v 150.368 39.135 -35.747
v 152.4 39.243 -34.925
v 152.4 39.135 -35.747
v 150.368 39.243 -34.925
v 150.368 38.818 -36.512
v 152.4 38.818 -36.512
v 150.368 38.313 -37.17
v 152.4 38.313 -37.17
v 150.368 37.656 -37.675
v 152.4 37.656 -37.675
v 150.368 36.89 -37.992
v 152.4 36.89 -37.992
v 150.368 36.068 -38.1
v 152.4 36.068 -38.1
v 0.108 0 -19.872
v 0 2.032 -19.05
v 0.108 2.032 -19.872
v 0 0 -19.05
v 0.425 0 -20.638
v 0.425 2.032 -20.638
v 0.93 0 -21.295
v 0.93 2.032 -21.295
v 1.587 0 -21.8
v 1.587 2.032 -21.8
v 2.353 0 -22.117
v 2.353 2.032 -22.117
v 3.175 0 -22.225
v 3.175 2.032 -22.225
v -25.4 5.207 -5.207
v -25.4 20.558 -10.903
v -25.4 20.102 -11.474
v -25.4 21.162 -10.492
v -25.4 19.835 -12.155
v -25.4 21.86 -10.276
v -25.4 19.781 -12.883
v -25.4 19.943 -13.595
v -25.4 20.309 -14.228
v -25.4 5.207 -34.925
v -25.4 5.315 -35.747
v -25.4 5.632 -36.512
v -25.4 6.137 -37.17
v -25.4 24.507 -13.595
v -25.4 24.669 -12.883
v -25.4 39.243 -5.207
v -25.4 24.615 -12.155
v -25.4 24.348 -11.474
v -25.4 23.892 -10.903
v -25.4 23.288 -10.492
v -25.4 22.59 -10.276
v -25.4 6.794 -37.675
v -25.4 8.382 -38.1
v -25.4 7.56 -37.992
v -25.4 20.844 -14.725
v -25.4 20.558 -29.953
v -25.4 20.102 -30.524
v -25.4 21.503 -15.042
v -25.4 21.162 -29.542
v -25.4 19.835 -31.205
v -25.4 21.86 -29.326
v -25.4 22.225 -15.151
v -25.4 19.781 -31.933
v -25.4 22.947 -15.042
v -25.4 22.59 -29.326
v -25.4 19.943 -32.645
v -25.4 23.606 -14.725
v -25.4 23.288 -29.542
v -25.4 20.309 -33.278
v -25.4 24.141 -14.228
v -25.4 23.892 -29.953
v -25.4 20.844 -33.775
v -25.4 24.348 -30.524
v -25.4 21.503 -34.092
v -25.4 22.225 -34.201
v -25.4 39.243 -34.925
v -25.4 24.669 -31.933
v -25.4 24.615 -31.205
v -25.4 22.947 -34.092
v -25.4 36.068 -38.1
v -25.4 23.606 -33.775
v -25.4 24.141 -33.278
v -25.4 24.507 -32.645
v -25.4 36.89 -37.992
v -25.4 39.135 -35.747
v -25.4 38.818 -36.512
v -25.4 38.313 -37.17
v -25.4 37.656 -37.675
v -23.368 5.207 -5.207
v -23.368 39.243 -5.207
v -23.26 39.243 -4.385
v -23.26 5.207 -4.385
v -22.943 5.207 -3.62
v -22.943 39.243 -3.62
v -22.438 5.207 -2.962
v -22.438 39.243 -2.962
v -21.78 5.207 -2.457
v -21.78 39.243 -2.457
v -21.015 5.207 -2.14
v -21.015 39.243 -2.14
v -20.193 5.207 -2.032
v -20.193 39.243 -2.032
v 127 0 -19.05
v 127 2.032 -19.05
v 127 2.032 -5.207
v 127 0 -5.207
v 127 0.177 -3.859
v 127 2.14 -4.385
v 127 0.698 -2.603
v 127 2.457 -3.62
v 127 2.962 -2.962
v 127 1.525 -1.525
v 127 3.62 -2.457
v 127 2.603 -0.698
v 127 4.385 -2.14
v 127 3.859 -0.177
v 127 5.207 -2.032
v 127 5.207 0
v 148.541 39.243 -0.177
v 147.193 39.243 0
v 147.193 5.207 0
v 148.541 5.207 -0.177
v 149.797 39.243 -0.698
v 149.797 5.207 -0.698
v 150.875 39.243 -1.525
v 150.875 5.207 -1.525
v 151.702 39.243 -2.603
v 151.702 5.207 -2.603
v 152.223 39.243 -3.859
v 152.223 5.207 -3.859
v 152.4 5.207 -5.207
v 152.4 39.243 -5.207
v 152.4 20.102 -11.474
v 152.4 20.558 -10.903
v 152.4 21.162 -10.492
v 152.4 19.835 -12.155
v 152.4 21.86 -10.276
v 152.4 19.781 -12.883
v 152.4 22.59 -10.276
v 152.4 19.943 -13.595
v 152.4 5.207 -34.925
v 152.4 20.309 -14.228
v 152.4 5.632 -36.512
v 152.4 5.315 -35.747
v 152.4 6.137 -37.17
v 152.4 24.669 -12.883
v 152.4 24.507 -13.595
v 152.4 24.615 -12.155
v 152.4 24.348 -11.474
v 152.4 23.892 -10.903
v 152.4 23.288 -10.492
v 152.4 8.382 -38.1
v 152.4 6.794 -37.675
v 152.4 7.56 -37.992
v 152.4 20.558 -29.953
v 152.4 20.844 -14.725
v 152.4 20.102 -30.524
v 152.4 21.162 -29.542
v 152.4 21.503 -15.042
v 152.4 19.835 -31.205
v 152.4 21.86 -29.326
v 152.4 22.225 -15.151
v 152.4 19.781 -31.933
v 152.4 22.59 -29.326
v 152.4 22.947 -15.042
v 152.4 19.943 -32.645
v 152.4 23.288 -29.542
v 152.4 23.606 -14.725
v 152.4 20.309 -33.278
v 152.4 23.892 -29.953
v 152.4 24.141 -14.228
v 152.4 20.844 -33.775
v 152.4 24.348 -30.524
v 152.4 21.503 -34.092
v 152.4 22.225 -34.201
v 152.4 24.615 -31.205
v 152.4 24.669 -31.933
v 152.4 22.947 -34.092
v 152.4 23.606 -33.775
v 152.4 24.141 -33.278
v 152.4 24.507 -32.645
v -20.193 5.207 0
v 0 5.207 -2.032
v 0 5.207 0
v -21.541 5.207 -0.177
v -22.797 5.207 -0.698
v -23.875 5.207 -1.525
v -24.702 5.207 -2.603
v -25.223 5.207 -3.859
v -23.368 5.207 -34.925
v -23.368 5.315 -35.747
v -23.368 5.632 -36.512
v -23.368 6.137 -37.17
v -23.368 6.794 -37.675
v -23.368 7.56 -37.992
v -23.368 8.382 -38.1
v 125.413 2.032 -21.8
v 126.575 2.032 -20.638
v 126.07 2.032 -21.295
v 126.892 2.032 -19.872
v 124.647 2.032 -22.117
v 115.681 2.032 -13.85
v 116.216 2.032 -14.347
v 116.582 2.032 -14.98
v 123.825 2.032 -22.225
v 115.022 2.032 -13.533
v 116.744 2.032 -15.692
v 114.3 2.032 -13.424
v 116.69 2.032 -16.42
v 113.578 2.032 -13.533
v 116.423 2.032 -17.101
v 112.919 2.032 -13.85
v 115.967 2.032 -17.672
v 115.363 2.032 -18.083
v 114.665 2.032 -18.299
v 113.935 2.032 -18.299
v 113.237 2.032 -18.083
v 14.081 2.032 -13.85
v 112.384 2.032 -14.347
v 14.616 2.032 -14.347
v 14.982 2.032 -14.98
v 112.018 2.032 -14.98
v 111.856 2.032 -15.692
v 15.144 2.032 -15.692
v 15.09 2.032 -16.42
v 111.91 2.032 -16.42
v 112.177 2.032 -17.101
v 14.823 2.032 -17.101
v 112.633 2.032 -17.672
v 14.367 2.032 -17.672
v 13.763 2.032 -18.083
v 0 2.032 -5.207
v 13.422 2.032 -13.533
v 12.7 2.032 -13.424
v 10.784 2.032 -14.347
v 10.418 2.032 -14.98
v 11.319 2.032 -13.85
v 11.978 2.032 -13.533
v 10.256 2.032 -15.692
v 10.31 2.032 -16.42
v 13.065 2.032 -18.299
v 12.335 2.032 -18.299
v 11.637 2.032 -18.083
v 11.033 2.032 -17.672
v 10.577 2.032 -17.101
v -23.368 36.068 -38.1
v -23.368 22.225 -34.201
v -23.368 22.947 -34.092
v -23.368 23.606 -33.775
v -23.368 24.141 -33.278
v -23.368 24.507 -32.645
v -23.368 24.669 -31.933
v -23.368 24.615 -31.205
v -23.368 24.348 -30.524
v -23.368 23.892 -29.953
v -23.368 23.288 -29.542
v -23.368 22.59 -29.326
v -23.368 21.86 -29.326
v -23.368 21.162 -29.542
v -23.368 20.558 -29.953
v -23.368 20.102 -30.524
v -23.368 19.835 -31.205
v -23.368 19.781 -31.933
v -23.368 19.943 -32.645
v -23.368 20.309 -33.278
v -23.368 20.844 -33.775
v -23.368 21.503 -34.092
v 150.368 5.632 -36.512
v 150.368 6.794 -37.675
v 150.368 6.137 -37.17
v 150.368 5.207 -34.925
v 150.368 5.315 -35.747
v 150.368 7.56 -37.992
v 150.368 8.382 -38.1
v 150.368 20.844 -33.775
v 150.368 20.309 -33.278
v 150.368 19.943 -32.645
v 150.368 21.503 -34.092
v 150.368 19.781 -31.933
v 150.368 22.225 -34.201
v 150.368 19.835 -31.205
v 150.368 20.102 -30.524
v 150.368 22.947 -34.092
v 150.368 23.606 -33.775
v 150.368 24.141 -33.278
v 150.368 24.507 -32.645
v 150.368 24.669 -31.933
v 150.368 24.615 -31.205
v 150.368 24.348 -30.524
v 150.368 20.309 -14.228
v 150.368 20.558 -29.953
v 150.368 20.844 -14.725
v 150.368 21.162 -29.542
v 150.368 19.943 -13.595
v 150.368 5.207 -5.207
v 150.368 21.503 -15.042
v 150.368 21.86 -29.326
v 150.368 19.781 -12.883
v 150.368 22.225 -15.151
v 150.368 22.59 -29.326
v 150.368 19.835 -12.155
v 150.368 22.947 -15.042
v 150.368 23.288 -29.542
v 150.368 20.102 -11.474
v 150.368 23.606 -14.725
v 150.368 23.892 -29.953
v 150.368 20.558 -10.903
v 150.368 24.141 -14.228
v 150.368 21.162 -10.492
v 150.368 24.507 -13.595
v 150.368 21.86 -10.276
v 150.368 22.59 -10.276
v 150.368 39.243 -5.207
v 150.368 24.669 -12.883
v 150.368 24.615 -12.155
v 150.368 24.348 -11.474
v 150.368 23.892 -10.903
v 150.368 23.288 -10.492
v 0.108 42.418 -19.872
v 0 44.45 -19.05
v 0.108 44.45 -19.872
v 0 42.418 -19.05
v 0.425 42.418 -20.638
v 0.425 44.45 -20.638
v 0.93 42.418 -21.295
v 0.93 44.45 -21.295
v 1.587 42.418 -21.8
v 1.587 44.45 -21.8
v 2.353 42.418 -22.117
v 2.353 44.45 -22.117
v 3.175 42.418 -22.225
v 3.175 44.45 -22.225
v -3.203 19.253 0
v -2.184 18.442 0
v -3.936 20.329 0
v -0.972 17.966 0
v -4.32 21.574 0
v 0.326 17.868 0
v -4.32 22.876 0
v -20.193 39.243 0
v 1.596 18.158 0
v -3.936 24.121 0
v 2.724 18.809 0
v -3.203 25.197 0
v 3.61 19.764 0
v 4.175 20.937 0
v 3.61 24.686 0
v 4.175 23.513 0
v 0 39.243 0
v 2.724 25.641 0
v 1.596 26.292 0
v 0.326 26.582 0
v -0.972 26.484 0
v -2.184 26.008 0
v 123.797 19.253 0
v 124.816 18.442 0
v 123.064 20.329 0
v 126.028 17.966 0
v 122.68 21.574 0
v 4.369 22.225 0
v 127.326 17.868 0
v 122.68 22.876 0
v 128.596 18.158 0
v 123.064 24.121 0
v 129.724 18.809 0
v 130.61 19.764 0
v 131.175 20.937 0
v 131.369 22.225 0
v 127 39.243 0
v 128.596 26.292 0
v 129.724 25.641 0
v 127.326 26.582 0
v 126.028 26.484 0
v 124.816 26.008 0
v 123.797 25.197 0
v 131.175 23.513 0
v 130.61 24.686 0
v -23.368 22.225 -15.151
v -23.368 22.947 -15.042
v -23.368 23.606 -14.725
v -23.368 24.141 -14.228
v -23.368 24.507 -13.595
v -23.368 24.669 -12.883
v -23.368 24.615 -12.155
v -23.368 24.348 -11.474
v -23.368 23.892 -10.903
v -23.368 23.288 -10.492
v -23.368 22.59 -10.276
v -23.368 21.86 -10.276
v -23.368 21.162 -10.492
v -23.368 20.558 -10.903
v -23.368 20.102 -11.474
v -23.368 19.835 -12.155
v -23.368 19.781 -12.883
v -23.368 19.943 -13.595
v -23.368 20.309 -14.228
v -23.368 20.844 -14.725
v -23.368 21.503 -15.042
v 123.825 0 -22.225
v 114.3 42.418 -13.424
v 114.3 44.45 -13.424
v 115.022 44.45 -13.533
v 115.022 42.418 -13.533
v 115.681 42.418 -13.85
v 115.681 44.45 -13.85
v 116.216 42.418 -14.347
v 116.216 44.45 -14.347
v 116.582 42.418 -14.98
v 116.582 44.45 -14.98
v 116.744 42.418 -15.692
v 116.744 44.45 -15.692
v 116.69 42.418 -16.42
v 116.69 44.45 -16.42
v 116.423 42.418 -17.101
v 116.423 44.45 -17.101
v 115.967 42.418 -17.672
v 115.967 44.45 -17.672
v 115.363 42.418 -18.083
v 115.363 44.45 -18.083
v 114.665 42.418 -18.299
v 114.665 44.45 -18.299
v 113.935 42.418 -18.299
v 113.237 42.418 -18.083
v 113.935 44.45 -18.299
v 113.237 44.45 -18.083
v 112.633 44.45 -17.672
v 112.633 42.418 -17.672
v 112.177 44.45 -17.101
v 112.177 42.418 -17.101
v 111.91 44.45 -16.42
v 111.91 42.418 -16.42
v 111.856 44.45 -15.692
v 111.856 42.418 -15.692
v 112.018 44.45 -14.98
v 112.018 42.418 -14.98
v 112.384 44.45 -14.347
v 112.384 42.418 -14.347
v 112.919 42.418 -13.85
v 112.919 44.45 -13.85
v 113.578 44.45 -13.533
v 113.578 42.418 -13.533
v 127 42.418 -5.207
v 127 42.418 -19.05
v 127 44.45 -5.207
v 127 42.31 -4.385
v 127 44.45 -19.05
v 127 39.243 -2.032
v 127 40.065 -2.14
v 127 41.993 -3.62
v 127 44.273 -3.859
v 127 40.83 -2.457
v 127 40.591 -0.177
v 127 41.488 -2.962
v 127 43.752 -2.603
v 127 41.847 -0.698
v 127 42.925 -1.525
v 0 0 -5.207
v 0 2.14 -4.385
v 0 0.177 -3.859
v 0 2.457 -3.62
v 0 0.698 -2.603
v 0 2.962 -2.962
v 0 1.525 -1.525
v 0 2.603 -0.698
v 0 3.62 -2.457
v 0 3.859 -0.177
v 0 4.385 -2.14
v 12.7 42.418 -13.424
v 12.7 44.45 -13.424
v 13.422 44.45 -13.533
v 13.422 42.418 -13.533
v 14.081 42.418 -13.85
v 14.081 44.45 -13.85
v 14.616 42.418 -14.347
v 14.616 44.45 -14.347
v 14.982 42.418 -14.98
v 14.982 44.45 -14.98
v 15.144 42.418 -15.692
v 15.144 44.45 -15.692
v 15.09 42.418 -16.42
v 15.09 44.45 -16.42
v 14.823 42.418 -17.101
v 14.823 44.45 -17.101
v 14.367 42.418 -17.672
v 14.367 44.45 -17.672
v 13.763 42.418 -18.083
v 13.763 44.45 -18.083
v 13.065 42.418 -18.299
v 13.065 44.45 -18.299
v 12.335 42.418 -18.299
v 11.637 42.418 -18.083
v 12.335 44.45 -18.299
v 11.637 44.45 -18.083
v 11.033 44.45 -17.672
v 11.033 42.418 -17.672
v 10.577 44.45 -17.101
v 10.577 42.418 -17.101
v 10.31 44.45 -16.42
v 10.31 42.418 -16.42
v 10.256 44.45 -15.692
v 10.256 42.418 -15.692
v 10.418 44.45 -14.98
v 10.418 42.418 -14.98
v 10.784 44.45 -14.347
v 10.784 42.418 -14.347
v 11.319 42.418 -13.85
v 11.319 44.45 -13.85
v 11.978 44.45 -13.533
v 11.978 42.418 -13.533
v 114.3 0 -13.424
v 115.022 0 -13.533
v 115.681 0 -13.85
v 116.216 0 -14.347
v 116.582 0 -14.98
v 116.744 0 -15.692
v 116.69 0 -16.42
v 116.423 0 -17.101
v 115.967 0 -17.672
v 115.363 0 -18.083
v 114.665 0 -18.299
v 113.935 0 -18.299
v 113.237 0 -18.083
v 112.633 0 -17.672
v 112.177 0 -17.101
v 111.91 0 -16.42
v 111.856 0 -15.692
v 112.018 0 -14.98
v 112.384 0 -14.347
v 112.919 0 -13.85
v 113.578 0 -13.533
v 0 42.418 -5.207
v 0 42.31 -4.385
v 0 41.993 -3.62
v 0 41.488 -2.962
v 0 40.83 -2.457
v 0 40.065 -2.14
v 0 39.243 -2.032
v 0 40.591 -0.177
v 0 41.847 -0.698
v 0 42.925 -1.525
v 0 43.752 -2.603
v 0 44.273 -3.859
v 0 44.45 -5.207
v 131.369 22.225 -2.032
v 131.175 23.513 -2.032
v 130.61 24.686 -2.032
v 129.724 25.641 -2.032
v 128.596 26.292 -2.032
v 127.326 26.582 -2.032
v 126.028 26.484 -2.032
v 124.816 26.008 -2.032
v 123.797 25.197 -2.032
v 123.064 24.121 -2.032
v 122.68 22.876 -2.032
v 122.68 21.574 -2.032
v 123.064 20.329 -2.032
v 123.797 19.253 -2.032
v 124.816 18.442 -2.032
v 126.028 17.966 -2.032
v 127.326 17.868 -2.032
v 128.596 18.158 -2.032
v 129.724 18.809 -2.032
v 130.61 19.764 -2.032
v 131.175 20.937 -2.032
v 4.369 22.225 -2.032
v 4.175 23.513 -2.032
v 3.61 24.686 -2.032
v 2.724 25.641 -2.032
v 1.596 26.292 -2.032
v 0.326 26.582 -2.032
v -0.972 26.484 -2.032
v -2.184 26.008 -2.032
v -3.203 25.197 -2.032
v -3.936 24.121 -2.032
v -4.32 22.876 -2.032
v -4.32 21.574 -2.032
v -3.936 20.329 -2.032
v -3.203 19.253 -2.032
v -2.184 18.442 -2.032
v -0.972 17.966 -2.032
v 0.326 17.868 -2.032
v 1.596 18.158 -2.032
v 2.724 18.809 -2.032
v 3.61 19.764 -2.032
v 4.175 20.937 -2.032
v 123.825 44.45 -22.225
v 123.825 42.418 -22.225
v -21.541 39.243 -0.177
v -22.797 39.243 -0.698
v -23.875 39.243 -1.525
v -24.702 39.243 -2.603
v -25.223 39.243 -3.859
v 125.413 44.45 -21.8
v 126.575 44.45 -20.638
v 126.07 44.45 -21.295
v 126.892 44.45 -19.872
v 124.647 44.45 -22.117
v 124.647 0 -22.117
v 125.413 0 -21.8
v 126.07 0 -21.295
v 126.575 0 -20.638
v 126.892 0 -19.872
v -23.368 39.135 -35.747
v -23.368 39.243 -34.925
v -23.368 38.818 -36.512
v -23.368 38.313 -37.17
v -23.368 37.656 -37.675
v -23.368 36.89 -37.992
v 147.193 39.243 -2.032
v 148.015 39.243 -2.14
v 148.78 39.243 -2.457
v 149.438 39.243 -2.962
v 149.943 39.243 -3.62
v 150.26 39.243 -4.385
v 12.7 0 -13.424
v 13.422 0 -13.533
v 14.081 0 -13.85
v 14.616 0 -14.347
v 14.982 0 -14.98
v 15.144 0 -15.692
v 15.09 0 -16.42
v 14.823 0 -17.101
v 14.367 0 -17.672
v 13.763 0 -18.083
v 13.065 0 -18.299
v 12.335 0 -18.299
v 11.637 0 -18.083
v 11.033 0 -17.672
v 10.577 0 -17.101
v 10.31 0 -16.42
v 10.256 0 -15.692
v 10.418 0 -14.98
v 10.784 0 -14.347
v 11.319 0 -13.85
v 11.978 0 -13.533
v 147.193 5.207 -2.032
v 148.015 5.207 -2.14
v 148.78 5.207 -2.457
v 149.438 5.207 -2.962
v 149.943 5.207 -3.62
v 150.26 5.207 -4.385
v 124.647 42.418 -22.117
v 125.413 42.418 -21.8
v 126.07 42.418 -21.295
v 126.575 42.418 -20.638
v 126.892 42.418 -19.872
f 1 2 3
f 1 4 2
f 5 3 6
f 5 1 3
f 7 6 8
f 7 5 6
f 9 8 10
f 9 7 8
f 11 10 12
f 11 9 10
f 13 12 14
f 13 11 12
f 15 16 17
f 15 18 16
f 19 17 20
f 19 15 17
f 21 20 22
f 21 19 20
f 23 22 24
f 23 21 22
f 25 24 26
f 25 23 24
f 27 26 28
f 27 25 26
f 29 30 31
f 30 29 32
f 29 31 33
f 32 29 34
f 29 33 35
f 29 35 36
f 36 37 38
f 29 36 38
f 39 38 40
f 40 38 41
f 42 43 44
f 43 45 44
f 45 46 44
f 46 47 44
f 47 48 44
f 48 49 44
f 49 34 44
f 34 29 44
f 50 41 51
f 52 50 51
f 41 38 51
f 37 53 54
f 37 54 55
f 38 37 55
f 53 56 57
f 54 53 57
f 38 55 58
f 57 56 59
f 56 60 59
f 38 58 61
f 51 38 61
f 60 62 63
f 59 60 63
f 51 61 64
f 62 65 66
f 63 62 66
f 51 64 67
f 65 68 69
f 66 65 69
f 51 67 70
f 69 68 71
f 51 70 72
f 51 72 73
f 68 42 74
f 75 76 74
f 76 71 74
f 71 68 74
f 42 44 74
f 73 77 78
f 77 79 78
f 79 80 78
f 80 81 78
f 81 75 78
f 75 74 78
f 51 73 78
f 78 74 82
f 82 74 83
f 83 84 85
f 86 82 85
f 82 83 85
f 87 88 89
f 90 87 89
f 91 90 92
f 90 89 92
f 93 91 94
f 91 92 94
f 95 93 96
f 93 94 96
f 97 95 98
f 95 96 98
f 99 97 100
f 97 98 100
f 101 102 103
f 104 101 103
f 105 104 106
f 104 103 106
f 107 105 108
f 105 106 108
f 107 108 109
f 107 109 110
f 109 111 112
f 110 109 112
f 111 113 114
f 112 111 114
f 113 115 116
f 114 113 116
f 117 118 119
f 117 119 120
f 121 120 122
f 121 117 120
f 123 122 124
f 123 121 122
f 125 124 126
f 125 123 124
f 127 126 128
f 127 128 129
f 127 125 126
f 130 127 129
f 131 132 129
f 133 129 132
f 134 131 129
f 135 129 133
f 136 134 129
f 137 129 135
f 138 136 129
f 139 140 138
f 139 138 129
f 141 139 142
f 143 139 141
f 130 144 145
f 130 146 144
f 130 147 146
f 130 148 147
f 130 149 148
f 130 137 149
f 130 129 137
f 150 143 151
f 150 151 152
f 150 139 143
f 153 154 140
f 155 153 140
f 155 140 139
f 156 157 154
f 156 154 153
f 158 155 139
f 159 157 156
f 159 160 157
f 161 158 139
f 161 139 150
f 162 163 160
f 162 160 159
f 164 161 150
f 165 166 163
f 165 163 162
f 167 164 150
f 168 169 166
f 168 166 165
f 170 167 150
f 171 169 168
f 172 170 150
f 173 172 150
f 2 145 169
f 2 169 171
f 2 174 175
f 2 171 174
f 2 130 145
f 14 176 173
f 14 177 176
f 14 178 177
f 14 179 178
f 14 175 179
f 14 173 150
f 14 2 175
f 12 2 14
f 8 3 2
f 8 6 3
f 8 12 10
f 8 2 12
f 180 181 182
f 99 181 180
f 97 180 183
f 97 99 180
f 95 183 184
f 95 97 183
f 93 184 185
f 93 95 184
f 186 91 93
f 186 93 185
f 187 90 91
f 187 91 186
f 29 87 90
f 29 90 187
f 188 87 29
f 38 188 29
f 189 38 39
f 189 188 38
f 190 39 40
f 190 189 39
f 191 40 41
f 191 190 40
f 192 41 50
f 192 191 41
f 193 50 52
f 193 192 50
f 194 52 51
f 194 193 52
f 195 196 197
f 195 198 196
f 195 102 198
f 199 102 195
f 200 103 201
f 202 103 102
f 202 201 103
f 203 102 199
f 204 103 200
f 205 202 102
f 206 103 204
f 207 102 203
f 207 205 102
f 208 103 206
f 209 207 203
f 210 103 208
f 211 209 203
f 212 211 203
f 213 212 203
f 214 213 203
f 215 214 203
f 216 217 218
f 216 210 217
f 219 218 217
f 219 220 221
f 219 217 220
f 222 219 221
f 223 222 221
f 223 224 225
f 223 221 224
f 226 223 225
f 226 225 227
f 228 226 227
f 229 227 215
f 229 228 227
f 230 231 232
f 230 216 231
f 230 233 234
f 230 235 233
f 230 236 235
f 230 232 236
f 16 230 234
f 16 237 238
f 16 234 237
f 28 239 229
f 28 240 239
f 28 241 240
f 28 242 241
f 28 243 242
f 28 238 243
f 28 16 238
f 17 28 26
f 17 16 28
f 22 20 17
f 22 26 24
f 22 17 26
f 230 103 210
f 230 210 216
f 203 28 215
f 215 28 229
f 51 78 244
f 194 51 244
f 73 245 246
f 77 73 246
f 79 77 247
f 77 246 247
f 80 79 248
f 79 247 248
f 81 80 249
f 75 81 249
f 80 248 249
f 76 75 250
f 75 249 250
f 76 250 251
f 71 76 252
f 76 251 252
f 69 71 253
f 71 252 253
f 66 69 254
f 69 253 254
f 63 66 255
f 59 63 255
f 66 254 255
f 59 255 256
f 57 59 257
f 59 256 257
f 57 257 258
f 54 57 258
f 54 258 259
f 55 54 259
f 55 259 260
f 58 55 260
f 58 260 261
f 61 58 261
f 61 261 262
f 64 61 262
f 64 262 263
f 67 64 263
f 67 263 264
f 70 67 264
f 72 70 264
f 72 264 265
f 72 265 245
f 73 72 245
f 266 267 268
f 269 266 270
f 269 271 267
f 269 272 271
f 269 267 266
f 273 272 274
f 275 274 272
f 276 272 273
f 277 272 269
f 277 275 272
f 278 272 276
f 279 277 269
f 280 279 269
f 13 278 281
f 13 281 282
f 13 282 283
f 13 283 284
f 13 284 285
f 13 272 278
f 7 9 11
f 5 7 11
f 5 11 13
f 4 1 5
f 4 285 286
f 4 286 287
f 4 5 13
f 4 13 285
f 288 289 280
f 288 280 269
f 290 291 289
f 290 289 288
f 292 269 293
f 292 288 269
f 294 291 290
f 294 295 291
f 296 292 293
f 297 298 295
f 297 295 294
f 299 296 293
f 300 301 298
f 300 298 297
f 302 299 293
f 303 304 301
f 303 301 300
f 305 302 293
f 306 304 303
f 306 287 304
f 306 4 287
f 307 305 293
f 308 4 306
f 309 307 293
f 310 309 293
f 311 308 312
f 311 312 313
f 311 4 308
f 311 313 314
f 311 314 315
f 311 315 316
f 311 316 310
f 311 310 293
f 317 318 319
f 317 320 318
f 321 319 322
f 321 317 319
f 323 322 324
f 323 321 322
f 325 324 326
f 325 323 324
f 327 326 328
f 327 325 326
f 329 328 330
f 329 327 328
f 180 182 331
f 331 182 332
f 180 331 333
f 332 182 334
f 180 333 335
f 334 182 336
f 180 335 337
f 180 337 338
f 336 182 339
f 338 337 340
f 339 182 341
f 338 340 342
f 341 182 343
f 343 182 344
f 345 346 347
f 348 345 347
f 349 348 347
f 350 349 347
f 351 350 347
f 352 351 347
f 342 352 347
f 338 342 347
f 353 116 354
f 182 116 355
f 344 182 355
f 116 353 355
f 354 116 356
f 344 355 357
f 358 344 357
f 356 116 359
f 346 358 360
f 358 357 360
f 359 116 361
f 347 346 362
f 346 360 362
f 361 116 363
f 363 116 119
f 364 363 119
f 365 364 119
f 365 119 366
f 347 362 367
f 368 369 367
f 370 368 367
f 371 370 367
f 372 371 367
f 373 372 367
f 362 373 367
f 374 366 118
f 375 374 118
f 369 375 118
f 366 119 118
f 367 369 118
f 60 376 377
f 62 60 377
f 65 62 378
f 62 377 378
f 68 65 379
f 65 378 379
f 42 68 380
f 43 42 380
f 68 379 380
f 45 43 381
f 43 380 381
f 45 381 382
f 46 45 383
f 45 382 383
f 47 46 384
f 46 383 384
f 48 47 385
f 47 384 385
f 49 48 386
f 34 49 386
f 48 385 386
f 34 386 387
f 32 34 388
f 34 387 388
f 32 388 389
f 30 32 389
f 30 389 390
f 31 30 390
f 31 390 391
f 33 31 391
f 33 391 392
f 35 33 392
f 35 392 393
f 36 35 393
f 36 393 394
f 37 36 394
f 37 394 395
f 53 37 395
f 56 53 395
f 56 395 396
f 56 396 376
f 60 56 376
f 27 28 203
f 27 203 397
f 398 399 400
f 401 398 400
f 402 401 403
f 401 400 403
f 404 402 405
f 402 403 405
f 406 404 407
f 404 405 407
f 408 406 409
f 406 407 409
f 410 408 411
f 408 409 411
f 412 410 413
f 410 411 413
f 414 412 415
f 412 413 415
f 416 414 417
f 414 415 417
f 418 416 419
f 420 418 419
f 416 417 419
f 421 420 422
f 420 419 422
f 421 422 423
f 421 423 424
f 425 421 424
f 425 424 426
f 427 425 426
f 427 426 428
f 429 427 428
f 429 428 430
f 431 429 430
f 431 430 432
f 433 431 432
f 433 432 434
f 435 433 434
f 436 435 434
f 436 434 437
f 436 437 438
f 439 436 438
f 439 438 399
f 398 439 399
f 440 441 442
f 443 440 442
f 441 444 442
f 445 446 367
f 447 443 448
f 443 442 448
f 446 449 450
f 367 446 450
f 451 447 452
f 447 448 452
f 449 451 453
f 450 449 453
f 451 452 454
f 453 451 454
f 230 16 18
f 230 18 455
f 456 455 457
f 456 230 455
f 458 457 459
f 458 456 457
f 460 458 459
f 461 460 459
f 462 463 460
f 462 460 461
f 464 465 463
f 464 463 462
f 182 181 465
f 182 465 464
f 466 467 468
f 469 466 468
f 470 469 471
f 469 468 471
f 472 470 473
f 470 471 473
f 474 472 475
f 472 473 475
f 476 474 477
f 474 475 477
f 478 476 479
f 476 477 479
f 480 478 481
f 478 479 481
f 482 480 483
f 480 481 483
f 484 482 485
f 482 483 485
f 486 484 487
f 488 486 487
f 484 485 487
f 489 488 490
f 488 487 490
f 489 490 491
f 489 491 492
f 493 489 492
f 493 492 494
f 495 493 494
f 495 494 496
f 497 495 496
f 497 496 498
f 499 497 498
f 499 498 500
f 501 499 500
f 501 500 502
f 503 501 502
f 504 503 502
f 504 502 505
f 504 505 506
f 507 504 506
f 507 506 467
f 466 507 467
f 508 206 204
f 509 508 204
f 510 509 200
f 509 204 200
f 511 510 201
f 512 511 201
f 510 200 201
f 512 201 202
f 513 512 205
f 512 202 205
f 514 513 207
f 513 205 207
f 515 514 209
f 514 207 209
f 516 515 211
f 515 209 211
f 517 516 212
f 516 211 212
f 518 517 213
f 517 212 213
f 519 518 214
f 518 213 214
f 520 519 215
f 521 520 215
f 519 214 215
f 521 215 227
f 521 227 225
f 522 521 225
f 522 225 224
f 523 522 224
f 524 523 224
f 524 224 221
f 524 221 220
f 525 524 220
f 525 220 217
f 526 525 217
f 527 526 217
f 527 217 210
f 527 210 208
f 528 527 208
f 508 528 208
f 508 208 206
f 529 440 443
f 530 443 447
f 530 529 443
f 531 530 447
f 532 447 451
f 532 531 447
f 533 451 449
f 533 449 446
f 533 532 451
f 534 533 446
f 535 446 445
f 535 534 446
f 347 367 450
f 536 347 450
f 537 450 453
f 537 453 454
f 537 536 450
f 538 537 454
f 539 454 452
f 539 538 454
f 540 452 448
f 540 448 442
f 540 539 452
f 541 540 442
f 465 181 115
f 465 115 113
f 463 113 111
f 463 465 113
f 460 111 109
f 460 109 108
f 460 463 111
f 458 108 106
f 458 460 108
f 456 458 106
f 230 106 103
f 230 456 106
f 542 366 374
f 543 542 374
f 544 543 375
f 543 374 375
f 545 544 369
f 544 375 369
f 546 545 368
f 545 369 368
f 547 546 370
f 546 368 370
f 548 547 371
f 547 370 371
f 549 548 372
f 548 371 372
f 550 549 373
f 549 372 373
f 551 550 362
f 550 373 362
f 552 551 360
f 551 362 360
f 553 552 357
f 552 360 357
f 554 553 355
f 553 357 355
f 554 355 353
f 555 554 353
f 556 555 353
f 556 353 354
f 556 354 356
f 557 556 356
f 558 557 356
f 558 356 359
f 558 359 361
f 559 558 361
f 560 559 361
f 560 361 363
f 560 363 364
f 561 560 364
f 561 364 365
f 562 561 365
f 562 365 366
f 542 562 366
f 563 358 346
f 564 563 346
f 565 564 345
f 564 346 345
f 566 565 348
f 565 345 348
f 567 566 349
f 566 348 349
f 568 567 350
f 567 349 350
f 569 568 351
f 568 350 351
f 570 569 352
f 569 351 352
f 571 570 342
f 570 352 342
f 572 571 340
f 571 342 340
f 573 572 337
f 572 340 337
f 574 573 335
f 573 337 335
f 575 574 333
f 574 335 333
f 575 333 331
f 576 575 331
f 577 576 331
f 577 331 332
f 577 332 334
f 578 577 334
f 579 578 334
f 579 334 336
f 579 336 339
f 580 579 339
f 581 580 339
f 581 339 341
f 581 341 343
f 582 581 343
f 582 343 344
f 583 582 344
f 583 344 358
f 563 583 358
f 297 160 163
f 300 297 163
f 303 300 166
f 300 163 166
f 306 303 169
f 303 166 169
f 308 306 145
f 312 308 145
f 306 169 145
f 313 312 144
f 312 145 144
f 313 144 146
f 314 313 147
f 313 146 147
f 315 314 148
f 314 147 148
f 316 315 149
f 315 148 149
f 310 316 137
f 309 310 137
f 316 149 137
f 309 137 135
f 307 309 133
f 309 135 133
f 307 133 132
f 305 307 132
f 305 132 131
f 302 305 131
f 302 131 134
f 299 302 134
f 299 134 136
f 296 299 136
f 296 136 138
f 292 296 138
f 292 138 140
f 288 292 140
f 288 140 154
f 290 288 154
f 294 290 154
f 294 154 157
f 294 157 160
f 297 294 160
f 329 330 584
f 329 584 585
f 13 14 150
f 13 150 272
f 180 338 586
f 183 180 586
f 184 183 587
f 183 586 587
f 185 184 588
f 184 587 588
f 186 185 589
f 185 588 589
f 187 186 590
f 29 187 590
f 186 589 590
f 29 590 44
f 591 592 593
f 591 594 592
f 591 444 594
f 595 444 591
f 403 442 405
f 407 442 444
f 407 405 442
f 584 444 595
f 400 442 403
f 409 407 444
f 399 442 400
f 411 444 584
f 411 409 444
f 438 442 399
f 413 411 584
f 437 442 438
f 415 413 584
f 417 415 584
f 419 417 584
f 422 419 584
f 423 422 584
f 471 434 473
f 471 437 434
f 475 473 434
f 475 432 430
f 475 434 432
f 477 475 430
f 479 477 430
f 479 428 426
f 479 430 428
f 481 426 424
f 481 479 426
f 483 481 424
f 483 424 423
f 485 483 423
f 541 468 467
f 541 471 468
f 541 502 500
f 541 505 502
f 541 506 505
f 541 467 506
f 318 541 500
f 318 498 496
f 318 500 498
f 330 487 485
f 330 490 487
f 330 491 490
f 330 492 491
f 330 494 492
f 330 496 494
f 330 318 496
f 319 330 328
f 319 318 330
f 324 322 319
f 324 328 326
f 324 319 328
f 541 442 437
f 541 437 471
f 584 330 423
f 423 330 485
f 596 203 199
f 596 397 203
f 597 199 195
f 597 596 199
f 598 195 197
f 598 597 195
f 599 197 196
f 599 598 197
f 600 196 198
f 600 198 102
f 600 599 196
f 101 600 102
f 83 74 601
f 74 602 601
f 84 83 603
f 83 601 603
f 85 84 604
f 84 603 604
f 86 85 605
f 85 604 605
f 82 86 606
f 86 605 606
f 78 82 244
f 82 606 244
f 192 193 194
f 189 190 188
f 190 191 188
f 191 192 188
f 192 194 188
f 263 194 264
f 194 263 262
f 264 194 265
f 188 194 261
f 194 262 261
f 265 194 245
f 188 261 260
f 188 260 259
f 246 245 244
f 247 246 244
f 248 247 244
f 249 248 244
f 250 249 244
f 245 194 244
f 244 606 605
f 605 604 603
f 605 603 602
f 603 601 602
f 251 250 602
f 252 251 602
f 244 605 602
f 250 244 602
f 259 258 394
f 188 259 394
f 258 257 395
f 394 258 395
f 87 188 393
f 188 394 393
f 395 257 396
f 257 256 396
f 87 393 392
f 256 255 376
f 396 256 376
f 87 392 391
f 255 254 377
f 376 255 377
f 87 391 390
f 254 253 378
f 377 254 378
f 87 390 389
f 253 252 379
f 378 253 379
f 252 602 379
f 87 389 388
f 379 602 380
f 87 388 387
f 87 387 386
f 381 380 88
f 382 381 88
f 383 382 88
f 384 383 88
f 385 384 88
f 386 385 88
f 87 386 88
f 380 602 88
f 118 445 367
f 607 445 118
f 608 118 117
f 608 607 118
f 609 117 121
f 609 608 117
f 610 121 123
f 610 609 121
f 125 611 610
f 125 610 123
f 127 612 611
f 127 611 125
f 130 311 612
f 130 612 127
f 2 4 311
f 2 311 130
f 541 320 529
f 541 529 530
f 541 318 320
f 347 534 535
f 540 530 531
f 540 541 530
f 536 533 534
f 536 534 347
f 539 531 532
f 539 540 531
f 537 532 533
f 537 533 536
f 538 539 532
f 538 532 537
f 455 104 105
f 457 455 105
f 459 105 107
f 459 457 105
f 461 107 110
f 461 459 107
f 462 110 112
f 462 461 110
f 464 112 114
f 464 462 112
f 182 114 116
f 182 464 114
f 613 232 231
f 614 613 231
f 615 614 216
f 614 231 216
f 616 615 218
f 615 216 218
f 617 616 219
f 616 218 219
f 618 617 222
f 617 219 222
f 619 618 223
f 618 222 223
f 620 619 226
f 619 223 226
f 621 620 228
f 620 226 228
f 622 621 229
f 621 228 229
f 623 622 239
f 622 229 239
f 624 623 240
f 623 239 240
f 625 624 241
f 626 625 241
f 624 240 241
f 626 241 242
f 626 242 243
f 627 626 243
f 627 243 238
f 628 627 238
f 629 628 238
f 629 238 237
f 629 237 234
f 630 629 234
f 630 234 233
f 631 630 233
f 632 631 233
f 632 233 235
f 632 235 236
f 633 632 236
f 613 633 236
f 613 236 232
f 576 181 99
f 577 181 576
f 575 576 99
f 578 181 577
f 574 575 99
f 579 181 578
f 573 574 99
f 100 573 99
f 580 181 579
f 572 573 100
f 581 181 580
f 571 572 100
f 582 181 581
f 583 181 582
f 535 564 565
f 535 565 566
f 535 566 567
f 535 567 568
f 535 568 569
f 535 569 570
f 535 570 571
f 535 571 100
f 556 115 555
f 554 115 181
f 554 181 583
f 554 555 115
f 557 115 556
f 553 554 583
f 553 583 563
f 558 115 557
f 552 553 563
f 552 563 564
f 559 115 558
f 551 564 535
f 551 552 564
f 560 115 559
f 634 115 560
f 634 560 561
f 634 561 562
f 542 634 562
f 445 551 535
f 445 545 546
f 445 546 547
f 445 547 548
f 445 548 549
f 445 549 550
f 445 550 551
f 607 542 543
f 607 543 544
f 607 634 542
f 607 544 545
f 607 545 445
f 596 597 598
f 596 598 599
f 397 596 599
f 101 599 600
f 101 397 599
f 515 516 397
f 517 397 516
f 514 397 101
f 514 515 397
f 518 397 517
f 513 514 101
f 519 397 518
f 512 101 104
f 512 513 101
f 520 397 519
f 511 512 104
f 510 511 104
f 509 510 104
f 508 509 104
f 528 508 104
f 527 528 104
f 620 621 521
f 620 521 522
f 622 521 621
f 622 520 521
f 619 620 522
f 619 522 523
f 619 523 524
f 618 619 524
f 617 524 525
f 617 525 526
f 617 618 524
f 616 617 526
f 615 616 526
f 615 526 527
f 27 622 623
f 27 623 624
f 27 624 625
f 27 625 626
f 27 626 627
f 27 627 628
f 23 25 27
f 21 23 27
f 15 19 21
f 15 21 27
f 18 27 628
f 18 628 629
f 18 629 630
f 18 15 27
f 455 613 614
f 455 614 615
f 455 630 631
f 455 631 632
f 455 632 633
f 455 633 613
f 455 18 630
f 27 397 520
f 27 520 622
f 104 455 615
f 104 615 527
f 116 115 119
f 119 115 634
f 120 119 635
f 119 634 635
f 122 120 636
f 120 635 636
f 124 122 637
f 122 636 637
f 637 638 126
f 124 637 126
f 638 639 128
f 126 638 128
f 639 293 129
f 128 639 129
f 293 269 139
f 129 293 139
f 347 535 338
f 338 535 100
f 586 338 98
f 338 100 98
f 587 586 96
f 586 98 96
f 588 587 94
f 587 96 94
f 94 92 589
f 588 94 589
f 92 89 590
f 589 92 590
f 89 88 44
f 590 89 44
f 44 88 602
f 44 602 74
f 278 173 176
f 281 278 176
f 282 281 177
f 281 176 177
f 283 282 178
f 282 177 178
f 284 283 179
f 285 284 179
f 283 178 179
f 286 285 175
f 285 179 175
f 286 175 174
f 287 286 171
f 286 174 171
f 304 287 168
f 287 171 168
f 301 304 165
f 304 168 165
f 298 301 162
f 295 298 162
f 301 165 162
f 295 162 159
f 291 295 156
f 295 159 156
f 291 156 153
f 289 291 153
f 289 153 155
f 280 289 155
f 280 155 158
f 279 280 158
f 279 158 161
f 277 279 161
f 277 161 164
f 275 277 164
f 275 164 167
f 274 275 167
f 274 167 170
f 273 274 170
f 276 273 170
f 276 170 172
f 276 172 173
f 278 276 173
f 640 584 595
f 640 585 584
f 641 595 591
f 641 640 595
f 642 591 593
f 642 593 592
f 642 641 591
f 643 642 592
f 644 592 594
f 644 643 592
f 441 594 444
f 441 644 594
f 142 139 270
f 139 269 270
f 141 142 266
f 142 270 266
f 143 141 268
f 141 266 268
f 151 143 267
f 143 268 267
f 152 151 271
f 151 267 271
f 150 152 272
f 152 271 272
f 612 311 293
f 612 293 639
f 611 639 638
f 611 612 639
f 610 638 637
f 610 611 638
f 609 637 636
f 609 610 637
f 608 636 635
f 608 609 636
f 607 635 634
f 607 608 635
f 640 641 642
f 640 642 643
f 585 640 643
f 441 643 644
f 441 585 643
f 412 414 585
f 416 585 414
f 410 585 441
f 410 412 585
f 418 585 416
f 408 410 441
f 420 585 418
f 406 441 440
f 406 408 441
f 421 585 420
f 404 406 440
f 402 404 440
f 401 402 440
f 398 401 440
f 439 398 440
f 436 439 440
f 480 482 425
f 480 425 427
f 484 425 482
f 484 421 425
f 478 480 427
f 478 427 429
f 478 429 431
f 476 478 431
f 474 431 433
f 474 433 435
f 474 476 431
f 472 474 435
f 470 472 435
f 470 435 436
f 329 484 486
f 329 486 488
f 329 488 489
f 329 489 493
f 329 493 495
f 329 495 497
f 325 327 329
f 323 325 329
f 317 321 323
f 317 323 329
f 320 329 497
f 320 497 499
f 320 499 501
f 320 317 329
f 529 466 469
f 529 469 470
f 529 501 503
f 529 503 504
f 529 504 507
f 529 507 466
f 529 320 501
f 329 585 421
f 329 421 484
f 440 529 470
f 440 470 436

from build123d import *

# Parameters (mm, degrees)
BASE_FLANGE1_DEPTH           = 127
SKETCH6_W                    = 2.032
SKETCH6_H                    = 34.036
BOSS_EXTRUDE1_DEPTH          = 25.4
EDGE_FLANGE1_STRIP_W         = 14.478
EDGE_FLANGE1_STRIP_H         = 2.032
EDGE_FLANGE1_STRIP_CUT_DEPTH = 34.036
EDGE_FLANGE1_DEPTH           = 34.036
SKETCH10_R                   = 2.4511
CUT_EXTRUDE1_DEPTH           = 188.190417757
SKETCH11_R                   = 2.4511
CUT_EXTRUDE2_DEPTH           = 164.257993679
SKETCH12_R                   = 4.3688
CUT_EXTRUDE3_DEPTH           = 164.257993679
FILLET1_R                    = 3.175


# Sheet-metal steps are written as plain solids
with BuildPart() as part:
    # Sketch1 → Base-Flange1 (new body)
    with BuildSketch(Plane(origin=(0, 0, 0), x_dir=(0, 0, -1), z_dir=(1, 0, 0))):
        with BuildLine():
            Line((22.225, 0), (5.207, 0))
            ThreePointArc((5.207, 0), (1.52509499, 1.52509499), (0, 5.207))
            Line((0, 5.207), (0, 39.243))
            ThreePointArc((0, 39.243), (1.52509499, 42.92490501), (5.207, 44.45))
            Line((5.207, 44.45), (22.225, 44.45))
            Line((22.225, 44.45), (22.225, 42.418))
            Line((22.225, 42.418), (5.207, 42.418))
            ThreePointArc((5.207, 42.418), (2.96193597, 41.48806403), (2.032, 39.243))
            Line((2.032, 39.243), (2.032, 5.207))
            ThreePointArc((2.032, 5.207), (2.96193597, 2.96193597), (5.207, 2.032))
            Line((5.207, 2.032), (22.225, 2.032))
            Line((22.225, 2.032), (22.225, 0))
        make_face()
    extrude(amount=BASE_FLANGE1_DEPTH)

    # Sketch6 → Boss-Extrude1 (add)
    with BuildSketch(Plane(origin=(127, 0, 0), x_dir=(0, 0, -1), z_dir=(1, 0, 0))):
        with Locations((1.016, 22.225)):
            Rectangle(SKETCH6_W, SKETCH6_H)
    boss_extrude1 = extrude(amount=BOSS_EXTRUDE1_DEPTH)

    # Edge-Flange1 strip (across the edge) → Edge-Flange1 strip cut (cut)
    with BuildSketch(Plane(origin=(152.4, 39.243, -2.032), x_dir=(-1, 0, 0), z_dir=(0, -1, 0))):
        with Locations((-2.032, -1.016)):
            Rectangle(EDGE_FLANGE1_STRIP_W, EDGE_FLANGE1_STRIP_H)
    edge_flange1_strip_cut = extrude(amount=EDGE_FLANGE1_STRIP_CUT_DEPTH, mode=Mode.SUBTRACT)

    # Edge-Flange1 section (across the edge) → Edge-Flange1 (add)
    with BuildSketch(Plane(origin=(152.4, 39.243, -2.032), x_dir=(-1, 0, 0), z_dir=(0, -1, 0))):
        with BuildLine():
            Line((0, 3.175), (0, 36.068))
            Line((0, 36.068), (2.032, 36.068))
            Line((2.032, 36.068), (2.032, 3.175))
            ThreePointArc((2.032, 3.175), (2.96193597, 0.92993597), (5.207, 0))
            Line((5.207, 0), (5.207, -2.032))
            ThreePointArc((5.207, -2.032), (1.52509499, -0.50690501), (0, 3.175))
        make_face()
    edge_flange1 = extrude(amount=EDGE_FLANGE1_DEPTH)

    # Mirror1: Boss-Extrude1, Edge-Flange1 strip cut, Edge-Flange1 across plane
    add(boss_extrude1.mirror(Plane(origin=(63.5, 0, 0), x_dir=(0, 0, 1), z_dir=(1, 0, 0))))
    add(edge_flange1_strip_cut.mirror(Plane(origin=(63.5, 0, 0), x_dir=(0, 0, 1), z_dir=(1, 0, 0))), mode=Mode.SUBTRACT)
    add(edge_flange1.mirror(Plane(origin=(63.5, 0, 0), x_dir=(0, 0, 1), z_dir=(1, 0, 0))))

    # Sketch10 → Cut-Extrude1 (cut, through all)
    with BuildSketch(Plane(origin=(152.4, 0, 0), x_dir=(0, 0, -1), z_dir=(1, 0, 0))):
        with Locations((12.7, 22.225)):
            Circle(SKETCH10_R)
        with Locations((31.75, 22.225)):
            Circle(SKETCH10_R)
    extrude(amount=-CUT_EXTRUDE1_DEPTH, mode=Mode.SUBTRACT)

    # Sketch11 → Cut-Extrude2 (cut, through all)
    with BuildSketch(Plane(origin=(0, 44.45, 0), x_dir=(1, 0, 0), z_dir=(0, 1, 0))):
        with Locations(Location((12.7, 15.875, 0), (0, 0, 270))):
            Circle(SKETCH11_R)
        with Locations(Location((114.3, 15.875, 0), (0, 0, 270))):
            Circle(SKETCH11_R)
    extrude(amount=-CUT_EXTRUDE2_DEPTH, mode=Mode.SUBTRACT)

    # Sketch12 → Cut-Extrude3 (cut, through all)
    with BuildSketch(Plane.XY):
        with Locations((0, 22.225)):
            Circle(SKETCH12_R)
        with Locations((127, 22.225)):
            Circle(SKETCH12_R)
    extrude(amount=-CUT_EXTRUDE3_DEPTH, mode=Mode.SUBTRACT)

    # Fillet1
    fillet1_edges = [part.edges().sort_by_distance(p)[0] for p in [
        (-24.384, 5.207, -38.1),
        (0, 1.016, -22.225),
        (-24.384, 39.243, -38.1),
        (0, 43.434, -22.225),
        (127, 1.016, -22.225),
        (151.384, 39.243, -38.1),
        (151.384, 5.207, -38.1),
        (127, 43.434, -22.225),
    ]]
    fillet(fillet1_edges, radius=FILLET1_R)


solid = part.part
